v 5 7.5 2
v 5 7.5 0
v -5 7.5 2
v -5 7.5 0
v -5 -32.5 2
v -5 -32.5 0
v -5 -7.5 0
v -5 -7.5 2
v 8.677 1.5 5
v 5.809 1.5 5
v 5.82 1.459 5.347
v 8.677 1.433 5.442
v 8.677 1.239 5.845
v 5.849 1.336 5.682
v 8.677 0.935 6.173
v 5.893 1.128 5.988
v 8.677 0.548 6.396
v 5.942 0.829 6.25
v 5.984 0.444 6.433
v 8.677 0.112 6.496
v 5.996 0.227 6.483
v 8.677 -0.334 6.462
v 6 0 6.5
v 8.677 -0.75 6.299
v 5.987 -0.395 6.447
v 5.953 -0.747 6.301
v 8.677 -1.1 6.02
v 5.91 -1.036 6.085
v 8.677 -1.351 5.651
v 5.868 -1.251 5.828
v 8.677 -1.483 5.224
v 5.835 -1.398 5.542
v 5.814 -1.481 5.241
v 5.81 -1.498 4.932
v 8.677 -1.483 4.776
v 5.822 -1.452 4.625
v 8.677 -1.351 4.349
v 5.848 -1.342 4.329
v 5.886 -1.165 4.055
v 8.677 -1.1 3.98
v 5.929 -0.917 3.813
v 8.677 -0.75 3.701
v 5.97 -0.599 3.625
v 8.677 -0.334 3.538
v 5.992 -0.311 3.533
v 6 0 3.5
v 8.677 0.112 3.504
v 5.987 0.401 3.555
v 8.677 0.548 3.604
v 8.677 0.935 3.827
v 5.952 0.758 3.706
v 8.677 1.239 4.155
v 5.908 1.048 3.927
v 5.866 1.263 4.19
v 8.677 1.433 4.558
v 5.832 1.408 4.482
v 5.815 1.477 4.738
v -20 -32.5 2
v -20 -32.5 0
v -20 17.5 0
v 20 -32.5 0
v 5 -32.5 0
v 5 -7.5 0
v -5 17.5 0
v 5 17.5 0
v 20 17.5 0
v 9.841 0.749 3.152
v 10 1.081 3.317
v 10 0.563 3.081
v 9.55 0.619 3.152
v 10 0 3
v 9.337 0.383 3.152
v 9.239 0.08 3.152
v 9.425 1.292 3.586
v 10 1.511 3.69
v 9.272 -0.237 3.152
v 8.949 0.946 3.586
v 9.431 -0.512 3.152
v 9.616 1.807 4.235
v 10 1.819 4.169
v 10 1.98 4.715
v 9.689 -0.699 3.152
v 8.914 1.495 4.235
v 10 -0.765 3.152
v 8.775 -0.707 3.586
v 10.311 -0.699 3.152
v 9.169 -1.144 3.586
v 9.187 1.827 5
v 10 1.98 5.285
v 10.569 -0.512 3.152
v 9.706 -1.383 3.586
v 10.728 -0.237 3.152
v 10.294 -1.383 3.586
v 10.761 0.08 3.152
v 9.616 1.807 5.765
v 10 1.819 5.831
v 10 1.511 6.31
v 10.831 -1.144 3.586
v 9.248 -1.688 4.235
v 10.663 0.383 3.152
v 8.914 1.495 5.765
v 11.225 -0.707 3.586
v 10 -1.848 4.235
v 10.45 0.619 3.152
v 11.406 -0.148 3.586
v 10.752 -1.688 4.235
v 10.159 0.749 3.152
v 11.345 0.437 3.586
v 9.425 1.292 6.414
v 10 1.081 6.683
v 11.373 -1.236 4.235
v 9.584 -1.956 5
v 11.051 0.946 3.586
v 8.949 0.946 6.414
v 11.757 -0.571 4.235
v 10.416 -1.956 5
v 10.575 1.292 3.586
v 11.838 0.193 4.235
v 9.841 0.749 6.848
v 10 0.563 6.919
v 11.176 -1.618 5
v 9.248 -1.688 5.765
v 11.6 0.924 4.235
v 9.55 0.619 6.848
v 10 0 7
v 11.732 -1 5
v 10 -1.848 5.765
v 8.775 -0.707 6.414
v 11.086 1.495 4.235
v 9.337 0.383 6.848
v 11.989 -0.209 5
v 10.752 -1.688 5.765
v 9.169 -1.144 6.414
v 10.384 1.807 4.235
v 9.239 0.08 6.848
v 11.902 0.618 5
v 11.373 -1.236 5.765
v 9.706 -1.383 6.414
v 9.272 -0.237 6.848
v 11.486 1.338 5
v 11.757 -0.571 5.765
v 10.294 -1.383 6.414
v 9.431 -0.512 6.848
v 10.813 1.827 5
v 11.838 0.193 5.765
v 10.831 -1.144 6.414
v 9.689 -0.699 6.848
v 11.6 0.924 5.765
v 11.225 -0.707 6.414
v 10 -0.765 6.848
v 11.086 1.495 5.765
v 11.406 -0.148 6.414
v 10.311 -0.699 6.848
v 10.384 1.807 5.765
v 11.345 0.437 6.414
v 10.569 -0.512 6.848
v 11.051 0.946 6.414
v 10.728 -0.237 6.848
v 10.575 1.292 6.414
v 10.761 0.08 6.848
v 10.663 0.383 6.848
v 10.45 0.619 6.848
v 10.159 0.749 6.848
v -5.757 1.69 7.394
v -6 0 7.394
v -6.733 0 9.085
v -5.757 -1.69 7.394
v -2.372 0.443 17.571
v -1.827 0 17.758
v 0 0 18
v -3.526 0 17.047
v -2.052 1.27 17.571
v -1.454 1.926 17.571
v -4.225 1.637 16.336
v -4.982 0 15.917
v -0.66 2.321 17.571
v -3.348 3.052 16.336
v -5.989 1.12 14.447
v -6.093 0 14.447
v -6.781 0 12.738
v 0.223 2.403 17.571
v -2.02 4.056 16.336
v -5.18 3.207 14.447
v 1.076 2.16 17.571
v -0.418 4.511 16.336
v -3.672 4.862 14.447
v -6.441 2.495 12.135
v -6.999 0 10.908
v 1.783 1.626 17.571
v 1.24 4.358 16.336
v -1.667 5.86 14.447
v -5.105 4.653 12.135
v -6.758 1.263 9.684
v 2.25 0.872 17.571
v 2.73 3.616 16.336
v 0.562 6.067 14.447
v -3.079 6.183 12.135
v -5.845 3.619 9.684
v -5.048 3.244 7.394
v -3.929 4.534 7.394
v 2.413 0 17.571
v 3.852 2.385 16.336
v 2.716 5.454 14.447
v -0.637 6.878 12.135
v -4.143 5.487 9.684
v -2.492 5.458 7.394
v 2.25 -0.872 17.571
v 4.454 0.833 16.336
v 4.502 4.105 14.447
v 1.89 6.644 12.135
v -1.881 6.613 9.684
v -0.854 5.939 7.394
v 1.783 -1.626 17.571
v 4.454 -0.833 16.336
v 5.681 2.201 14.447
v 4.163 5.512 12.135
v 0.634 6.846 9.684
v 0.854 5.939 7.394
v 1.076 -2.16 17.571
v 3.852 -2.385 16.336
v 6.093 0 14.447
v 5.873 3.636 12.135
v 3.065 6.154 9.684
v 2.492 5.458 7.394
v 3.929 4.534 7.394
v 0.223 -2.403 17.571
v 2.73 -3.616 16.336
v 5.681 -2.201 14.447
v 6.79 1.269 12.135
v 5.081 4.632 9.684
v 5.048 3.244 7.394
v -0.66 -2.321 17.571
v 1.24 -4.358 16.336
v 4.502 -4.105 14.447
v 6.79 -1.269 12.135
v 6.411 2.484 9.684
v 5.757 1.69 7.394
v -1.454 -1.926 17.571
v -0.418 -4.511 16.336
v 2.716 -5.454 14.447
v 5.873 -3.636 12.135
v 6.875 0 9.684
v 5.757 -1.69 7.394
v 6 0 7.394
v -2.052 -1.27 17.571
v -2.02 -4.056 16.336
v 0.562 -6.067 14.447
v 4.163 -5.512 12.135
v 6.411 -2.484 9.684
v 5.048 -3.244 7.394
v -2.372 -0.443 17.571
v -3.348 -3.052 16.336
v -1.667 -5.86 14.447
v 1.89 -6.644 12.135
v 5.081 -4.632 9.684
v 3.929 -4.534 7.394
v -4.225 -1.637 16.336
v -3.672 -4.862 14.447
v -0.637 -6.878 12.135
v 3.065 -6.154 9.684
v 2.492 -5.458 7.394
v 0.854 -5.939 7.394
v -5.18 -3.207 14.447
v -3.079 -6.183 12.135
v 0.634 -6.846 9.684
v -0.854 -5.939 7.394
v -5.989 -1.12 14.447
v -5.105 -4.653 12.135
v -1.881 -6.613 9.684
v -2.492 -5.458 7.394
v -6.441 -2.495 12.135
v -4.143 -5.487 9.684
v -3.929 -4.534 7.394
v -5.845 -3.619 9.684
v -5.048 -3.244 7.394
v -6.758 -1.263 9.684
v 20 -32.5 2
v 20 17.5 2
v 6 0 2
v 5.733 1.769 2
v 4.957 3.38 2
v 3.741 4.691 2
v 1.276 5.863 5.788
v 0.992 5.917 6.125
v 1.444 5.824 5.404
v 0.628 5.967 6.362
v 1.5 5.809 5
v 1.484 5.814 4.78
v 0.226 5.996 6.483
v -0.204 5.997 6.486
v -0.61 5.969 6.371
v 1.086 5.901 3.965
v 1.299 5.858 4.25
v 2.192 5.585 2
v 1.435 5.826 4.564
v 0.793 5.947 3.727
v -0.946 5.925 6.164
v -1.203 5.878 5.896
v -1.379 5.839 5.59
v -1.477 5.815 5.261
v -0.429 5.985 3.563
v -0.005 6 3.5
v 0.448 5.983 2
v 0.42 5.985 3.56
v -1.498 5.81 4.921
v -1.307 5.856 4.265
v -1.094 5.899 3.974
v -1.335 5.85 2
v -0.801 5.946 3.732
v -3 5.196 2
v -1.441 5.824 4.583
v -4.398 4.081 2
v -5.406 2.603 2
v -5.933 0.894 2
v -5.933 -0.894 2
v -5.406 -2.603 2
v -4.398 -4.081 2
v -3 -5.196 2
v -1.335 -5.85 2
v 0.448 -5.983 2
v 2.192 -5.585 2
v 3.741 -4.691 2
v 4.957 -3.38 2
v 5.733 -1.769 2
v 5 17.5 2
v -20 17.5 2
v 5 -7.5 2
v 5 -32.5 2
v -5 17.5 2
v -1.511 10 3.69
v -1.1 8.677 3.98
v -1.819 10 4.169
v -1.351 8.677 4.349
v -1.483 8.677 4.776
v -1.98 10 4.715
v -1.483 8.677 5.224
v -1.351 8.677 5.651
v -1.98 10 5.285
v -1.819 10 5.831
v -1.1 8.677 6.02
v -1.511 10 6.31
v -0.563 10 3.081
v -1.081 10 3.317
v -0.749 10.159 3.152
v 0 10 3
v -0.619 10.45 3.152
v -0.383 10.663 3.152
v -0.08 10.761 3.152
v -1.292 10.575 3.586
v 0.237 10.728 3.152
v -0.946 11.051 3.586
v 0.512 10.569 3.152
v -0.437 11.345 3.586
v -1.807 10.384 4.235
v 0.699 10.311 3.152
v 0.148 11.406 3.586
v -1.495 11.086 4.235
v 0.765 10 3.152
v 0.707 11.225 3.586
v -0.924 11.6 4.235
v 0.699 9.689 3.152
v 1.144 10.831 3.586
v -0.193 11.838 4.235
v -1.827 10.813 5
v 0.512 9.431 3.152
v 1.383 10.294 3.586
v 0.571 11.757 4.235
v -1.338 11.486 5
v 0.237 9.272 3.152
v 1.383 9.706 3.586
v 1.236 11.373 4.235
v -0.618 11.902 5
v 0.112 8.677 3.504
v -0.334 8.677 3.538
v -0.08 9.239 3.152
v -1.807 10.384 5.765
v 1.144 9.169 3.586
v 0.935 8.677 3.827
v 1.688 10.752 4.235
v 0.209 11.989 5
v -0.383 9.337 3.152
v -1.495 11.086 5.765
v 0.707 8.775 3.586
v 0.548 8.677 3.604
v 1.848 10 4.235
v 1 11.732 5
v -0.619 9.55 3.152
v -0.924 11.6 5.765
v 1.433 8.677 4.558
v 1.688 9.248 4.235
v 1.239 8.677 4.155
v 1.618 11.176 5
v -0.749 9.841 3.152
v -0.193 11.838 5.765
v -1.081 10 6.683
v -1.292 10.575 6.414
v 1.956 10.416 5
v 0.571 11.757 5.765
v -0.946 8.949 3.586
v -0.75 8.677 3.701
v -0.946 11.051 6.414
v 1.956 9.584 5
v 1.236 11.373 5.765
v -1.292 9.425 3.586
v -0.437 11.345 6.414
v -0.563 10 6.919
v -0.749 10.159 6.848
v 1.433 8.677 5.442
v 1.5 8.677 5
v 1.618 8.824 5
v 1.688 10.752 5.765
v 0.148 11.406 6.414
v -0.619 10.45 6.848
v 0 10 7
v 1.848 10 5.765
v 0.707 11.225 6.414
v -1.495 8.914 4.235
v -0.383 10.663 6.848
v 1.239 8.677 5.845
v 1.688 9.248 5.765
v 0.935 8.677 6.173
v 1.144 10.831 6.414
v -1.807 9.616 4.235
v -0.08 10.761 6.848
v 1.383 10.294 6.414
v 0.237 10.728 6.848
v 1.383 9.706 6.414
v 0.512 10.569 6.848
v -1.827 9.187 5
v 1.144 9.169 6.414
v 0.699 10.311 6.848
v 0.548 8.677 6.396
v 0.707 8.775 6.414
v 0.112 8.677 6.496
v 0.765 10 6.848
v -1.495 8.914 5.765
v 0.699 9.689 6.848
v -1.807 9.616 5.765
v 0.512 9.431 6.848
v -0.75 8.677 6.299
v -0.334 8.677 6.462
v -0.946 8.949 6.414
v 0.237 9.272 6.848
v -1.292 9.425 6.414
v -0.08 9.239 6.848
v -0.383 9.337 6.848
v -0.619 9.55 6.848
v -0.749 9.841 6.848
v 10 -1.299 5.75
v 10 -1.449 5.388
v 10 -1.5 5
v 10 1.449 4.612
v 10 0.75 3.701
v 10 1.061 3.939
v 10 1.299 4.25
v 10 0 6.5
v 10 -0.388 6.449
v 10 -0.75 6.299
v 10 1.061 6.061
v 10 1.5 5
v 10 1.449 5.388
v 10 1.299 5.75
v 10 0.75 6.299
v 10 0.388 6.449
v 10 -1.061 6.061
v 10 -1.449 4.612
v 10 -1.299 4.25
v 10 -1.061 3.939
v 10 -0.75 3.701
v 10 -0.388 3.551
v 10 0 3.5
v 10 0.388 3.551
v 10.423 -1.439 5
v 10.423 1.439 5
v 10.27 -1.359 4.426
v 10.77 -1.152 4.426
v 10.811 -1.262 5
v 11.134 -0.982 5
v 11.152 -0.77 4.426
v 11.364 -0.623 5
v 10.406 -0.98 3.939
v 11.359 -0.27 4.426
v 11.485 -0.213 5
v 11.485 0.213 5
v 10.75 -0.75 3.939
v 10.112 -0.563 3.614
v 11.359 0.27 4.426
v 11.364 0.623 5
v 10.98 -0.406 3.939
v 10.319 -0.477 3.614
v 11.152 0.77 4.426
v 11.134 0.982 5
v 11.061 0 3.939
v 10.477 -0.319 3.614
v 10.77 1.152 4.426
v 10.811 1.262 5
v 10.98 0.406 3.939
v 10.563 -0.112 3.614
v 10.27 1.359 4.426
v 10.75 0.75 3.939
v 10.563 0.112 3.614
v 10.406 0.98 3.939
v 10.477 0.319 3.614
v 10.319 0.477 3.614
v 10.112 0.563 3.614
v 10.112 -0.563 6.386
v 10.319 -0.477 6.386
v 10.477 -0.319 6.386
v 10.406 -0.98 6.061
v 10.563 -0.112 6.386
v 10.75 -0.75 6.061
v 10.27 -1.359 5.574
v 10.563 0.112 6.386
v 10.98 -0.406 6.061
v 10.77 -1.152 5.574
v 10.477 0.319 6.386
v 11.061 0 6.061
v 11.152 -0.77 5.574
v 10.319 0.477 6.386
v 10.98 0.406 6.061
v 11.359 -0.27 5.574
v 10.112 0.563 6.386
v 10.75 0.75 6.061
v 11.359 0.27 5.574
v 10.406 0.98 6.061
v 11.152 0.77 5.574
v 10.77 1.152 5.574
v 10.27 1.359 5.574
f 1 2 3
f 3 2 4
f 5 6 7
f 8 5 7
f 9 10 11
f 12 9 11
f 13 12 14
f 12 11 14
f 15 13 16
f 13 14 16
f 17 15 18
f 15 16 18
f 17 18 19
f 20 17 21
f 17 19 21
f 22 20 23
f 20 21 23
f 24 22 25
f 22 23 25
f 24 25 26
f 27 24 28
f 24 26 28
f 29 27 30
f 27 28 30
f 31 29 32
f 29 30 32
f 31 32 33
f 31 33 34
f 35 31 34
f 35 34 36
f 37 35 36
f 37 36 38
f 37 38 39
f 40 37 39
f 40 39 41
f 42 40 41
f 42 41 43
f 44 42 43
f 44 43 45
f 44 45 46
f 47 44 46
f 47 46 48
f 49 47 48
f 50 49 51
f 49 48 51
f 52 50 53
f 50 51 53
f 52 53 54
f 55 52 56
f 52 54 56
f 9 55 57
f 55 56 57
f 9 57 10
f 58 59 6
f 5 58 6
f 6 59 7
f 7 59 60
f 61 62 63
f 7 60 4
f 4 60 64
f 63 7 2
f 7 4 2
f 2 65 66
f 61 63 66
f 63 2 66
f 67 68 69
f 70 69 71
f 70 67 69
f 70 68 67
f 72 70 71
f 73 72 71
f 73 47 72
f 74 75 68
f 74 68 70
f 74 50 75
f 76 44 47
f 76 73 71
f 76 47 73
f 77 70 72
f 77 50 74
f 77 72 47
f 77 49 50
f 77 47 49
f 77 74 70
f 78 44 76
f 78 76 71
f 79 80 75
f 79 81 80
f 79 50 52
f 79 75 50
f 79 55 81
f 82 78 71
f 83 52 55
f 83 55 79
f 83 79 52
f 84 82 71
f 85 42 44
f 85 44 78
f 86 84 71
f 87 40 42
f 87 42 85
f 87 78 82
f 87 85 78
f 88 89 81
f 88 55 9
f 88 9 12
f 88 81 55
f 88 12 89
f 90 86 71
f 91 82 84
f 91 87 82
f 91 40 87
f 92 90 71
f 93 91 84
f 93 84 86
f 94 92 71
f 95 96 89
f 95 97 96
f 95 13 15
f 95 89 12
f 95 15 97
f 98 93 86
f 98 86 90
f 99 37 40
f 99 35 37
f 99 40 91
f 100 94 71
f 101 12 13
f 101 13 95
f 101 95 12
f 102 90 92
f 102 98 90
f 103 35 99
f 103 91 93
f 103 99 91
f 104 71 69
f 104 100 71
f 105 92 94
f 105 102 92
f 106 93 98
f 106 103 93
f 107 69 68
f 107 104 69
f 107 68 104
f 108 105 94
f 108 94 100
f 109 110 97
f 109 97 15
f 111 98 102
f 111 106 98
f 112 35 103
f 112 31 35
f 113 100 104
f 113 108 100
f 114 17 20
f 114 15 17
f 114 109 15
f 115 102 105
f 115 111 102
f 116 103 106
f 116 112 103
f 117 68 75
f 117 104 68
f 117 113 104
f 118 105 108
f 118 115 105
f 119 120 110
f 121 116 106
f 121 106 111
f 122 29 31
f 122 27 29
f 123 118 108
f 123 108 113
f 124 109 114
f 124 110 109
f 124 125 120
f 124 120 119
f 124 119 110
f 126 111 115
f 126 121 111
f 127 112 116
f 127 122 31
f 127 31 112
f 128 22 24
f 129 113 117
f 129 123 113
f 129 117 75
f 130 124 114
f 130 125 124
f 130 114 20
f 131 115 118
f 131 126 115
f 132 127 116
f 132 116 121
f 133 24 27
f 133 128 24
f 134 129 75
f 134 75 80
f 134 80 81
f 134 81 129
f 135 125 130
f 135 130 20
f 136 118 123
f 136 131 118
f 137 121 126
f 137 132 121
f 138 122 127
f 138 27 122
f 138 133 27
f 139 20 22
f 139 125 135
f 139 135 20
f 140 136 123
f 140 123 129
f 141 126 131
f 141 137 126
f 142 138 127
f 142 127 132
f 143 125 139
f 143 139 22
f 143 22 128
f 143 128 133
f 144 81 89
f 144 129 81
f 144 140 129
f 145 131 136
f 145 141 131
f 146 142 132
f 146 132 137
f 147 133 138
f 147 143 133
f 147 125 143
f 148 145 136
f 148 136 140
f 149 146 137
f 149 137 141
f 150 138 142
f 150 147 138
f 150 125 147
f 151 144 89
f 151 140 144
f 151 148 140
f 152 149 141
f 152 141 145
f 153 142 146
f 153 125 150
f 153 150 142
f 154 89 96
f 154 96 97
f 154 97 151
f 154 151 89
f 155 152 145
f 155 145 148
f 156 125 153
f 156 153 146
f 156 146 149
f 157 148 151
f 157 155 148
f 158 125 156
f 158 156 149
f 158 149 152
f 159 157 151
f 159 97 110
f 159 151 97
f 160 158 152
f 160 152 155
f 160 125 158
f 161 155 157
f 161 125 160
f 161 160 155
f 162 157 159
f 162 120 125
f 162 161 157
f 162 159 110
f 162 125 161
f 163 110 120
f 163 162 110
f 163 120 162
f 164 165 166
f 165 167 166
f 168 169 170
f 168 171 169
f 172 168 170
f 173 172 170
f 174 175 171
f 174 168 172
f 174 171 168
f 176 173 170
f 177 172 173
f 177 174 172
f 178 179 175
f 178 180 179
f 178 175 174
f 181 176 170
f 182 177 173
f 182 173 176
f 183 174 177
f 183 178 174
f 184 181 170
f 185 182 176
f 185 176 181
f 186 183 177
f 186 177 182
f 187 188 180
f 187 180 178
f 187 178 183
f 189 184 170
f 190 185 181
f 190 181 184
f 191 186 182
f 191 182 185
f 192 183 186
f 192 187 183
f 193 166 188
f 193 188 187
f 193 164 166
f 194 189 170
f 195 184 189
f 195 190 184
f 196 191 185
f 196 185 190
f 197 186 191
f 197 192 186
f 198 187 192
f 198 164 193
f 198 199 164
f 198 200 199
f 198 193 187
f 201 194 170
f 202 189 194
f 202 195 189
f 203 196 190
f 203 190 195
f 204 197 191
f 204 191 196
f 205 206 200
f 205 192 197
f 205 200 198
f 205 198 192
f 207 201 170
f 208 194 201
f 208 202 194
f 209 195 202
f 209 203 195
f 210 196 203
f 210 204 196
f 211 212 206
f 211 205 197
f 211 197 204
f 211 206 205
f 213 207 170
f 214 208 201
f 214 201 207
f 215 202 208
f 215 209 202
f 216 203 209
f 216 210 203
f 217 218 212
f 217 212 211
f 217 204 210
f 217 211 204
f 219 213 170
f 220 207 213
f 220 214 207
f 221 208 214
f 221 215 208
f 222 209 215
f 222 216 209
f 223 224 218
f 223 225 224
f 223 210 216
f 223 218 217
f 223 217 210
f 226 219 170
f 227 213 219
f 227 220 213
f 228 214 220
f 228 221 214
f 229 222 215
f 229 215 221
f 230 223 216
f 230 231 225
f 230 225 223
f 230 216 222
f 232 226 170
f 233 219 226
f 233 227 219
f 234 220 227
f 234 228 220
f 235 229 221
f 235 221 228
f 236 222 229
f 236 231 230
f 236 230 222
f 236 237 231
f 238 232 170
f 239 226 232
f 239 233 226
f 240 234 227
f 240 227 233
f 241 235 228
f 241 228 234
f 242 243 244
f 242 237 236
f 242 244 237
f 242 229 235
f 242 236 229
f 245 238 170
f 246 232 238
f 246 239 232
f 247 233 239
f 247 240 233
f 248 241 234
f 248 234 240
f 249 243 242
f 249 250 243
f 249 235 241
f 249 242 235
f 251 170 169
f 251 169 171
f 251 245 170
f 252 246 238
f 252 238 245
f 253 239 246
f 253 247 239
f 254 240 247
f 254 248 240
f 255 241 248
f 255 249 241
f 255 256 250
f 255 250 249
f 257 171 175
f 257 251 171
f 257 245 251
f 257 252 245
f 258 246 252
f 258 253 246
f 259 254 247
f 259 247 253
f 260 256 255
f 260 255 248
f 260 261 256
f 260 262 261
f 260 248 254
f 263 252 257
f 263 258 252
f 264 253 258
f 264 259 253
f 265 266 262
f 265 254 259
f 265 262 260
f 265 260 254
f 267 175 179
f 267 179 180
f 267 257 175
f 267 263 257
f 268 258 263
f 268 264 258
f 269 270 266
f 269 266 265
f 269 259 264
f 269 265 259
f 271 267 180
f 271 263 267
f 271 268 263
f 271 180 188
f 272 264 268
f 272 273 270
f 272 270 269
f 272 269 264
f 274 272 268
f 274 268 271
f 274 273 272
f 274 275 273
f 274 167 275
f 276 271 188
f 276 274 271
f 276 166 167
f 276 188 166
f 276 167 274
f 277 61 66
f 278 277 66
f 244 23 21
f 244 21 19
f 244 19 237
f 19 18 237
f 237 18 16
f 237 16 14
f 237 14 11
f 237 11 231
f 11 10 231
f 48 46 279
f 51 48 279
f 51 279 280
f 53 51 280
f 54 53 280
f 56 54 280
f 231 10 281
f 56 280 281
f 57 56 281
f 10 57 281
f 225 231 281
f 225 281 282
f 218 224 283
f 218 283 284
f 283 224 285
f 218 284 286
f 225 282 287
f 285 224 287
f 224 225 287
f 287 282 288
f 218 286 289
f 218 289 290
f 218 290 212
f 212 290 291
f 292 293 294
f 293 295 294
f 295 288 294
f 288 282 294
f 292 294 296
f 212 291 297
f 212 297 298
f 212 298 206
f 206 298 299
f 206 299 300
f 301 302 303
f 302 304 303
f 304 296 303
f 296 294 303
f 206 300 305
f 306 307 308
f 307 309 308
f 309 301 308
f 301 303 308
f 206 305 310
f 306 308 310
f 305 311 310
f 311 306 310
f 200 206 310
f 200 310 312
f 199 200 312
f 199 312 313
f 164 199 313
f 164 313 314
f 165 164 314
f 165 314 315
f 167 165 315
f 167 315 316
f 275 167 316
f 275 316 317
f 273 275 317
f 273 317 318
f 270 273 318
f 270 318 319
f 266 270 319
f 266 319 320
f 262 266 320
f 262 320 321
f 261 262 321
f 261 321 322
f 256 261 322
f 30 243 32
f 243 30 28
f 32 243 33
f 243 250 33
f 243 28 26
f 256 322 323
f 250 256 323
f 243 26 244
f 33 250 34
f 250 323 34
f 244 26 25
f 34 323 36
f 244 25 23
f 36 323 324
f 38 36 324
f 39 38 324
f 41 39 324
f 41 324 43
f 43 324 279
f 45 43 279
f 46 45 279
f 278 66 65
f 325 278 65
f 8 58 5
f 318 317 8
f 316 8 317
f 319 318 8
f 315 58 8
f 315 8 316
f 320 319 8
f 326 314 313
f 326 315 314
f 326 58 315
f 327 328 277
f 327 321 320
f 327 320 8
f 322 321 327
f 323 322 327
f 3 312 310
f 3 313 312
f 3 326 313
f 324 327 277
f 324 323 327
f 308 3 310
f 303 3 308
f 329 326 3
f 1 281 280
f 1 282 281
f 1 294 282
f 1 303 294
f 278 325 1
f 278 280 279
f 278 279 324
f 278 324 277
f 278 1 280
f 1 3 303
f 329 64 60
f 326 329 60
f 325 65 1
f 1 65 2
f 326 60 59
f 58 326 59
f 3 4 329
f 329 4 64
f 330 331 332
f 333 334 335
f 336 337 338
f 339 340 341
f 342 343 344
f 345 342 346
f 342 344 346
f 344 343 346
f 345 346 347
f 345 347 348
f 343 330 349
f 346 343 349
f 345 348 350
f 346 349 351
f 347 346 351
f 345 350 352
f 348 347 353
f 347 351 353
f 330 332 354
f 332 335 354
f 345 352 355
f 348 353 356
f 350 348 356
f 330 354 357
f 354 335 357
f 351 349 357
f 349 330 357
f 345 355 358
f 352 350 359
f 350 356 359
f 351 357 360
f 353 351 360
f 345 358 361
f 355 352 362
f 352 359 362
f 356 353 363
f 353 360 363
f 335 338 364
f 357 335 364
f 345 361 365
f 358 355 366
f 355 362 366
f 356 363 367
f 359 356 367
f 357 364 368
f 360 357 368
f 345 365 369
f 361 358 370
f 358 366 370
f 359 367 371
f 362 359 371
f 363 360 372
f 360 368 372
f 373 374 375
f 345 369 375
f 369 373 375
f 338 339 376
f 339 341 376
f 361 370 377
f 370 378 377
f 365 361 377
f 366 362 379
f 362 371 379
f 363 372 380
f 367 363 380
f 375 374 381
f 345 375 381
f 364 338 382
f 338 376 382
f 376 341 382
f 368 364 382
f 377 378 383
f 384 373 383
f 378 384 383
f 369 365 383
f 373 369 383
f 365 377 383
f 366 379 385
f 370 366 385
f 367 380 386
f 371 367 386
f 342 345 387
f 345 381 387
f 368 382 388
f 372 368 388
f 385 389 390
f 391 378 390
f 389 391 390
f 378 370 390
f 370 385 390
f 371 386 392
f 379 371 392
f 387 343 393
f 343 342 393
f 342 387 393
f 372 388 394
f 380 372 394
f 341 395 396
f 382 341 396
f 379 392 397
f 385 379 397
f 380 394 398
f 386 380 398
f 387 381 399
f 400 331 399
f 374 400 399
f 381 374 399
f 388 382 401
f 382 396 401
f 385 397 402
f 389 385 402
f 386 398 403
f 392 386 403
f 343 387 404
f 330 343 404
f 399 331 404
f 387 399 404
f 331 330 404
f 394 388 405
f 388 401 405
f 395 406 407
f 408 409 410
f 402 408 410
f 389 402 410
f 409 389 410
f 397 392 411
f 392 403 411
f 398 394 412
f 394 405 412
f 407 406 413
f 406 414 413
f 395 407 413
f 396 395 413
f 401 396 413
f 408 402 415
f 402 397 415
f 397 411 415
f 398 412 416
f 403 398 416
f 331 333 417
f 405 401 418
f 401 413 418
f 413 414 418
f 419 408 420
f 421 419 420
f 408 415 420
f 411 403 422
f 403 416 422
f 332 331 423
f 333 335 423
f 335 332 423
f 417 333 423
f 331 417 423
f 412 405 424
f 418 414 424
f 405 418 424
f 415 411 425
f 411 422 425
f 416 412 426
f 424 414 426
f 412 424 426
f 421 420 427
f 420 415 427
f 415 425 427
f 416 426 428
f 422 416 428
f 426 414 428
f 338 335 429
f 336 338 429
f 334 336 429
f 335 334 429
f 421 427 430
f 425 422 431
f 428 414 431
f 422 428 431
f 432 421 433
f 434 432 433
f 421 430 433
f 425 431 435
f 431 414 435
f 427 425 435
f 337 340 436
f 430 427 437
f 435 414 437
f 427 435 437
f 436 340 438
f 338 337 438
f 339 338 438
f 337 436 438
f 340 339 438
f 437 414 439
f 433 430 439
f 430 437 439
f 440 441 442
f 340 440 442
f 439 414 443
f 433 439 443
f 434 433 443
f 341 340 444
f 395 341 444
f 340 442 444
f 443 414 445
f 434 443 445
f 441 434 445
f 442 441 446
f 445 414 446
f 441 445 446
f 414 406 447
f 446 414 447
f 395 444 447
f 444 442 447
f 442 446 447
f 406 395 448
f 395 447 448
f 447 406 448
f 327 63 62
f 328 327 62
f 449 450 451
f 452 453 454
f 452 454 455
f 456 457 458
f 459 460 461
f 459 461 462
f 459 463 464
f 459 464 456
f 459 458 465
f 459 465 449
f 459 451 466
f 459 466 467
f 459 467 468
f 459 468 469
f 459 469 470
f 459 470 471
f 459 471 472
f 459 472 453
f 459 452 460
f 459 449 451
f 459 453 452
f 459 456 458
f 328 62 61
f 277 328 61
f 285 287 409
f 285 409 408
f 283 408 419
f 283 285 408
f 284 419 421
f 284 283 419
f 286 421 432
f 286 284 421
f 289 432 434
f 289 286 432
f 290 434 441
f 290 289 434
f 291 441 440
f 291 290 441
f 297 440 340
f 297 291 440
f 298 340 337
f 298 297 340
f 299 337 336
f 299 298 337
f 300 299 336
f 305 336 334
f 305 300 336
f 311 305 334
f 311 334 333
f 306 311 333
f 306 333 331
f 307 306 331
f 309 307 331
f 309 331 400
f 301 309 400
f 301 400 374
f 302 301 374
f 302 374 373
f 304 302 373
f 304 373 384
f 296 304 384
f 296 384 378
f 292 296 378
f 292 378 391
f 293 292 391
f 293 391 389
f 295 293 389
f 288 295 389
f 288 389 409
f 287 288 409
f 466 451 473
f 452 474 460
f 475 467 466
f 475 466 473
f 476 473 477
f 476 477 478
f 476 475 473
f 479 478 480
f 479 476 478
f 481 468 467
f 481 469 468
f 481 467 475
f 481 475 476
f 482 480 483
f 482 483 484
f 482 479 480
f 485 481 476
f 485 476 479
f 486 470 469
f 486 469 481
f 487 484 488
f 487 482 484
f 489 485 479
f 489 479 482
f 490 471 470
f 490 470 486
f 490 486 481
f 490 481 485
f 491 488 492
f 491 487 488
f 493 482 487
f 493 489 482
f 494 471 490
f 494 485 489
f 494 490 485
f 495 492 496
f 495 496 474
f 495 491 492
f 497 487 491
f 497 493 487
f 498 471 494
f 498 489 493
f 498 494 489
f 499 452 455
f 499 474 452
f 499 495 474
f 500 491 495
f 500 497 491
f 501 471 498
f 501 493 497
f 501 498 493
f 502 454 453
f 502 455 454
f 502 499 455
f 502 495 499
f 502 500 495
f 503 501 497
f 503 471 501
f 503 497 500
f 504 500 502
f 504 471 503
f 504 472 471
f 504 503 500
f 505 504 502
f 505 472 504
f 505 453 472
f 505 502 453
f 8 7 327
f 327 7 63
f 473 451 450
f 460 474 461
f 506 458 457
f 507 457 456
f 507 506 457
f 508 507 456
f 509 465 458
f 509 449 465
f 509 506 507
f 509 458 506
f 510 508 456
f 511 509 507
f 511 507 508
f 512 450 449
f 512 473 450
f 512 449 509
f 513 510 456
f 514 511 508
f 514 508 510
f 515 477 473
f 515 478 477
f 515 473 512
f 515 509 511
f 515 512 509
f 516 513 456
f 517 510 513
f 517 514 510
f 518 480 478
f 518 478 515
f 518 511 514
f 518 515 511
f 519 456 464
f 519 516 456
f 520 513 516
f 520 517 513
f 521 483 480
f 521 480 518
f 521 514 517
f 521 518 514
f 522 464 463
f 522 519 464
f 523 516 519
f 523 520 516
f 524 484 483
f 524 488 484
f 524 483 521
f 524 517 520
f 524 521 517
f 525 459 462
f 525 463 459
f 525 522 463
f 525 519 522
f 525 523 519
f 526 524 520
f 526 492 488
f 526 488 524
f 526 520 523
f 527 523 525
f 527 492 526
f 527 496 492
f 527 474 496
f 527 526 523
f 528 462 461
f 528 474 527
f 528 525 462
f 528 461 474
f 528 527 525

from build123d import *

# Parameters (mm, degrees)
F1_DEPTH  = 2
F2_R      = 6
F3_DEPTH  = 7.5
F7_START  = 5
F6_R      = 1.5
F7_DEPTH  = 5
F11_START = -5
F10_R     = 1.5
F11_DEPTH = 5


with BuildPart() as f1:
    # F0 (on Top) → F1 (new body)
    with BuildSketch(Plane.XY):
        Polygon((-5, 17.5), (-20, 17.5), (-20, -32.5), (-5, -32.5), (-5, -7.5), (5, -7.5), (5, -32.5), (20, -32.5), (20, 17.5), (5, 17.5), (5, 7.5), (-5, 7.5), align=None)
    extrude(amount=F1_DEPTH)

    # F2 (on face) → F3 (join)
    with BuildSketch(Plane.XY.offset(2)):
        Circle(F2_R)
    extrude(amount=F3_DEPTH)

    # F4 (on Front) → F5 (revolve)
    with BuildSketch(Plane.XZ):
        with BuildLine():
            Line((0, 4), (0, 18))
            ThreePointArc((0, 18), (-7, 11), (0, 4))
        make_face()
    revolve(axis=Axis((0, 0, 11), (0, 0, -1)))

    # F6 (on Right) → F7 (join)
    with BuildSketch(Plane.YZ.offset(F7_START)):
        with Locations((0, 5)):
            Circle(F6_R)
    extrude(amount=F7_DEPTH)

    # F8 (on face) → F9 (revolve)
    with BuildSketch(Plane.YZ.offset(10)):
        with BuildLine():
            Line((0, 3.5), (0, 3))
            ThreePointArc((0, 3), (2, 5), (0, 7))
            Line((0, 7), (0, 6.5))
            ThreePointArc((0, 6.5), (1.0606601718, 6.0606601718), (1.5, 5))
            ThreePointArc((1.5, 5), (1.0606601718, 3.9393398282), (0, 3.5))
        make_face()
    revolve(axis=Axis((10, 0, 5), (0, 0, 1)))

    # F10 (on Front) → F11 (join)
    with BuildSketch(Plane.XZ.offset(F11_START)):
        with Locations((0, 5)):
            Circle(F10_R)
    extrude(amount=-F11_DEPTH)

    # F12 (on face) → F13 (revolve)
    with BuildSketch(Plane(origin=(0, 10, 0), x_dir=(-1, 0, 0), z_dir=(0, 1, 0))):
        with BuildLine():
            ThreePointArc((0, 3), (2, 5), (0, 7))
            Line((0, 7), (0, 6.5))
            ThreePointArc((0, 6.5), (1.0606601718, 6.0606601718), (1.5, 5))
            ThreePointArc((1.5, 5), (1.0606601718, 3.9393398282), (0, 3.5))
            Line((0, 3.5), (0, 3))
        make_face()
        with BuildLine():
            ThreePointArc((1.5, 5), (1.0606601718, 6.0606601718), (0, 6.5))
            Line((0, 6.5), (0, 3.5))
            ThreePointArc((0, 3.5), (1.0606601718, 3.9393398282), (1.5, 5))
        make_face()
    revolve(axis=Axis((0, 10, 5), (0, 0, -1)))


solid = f1.part
